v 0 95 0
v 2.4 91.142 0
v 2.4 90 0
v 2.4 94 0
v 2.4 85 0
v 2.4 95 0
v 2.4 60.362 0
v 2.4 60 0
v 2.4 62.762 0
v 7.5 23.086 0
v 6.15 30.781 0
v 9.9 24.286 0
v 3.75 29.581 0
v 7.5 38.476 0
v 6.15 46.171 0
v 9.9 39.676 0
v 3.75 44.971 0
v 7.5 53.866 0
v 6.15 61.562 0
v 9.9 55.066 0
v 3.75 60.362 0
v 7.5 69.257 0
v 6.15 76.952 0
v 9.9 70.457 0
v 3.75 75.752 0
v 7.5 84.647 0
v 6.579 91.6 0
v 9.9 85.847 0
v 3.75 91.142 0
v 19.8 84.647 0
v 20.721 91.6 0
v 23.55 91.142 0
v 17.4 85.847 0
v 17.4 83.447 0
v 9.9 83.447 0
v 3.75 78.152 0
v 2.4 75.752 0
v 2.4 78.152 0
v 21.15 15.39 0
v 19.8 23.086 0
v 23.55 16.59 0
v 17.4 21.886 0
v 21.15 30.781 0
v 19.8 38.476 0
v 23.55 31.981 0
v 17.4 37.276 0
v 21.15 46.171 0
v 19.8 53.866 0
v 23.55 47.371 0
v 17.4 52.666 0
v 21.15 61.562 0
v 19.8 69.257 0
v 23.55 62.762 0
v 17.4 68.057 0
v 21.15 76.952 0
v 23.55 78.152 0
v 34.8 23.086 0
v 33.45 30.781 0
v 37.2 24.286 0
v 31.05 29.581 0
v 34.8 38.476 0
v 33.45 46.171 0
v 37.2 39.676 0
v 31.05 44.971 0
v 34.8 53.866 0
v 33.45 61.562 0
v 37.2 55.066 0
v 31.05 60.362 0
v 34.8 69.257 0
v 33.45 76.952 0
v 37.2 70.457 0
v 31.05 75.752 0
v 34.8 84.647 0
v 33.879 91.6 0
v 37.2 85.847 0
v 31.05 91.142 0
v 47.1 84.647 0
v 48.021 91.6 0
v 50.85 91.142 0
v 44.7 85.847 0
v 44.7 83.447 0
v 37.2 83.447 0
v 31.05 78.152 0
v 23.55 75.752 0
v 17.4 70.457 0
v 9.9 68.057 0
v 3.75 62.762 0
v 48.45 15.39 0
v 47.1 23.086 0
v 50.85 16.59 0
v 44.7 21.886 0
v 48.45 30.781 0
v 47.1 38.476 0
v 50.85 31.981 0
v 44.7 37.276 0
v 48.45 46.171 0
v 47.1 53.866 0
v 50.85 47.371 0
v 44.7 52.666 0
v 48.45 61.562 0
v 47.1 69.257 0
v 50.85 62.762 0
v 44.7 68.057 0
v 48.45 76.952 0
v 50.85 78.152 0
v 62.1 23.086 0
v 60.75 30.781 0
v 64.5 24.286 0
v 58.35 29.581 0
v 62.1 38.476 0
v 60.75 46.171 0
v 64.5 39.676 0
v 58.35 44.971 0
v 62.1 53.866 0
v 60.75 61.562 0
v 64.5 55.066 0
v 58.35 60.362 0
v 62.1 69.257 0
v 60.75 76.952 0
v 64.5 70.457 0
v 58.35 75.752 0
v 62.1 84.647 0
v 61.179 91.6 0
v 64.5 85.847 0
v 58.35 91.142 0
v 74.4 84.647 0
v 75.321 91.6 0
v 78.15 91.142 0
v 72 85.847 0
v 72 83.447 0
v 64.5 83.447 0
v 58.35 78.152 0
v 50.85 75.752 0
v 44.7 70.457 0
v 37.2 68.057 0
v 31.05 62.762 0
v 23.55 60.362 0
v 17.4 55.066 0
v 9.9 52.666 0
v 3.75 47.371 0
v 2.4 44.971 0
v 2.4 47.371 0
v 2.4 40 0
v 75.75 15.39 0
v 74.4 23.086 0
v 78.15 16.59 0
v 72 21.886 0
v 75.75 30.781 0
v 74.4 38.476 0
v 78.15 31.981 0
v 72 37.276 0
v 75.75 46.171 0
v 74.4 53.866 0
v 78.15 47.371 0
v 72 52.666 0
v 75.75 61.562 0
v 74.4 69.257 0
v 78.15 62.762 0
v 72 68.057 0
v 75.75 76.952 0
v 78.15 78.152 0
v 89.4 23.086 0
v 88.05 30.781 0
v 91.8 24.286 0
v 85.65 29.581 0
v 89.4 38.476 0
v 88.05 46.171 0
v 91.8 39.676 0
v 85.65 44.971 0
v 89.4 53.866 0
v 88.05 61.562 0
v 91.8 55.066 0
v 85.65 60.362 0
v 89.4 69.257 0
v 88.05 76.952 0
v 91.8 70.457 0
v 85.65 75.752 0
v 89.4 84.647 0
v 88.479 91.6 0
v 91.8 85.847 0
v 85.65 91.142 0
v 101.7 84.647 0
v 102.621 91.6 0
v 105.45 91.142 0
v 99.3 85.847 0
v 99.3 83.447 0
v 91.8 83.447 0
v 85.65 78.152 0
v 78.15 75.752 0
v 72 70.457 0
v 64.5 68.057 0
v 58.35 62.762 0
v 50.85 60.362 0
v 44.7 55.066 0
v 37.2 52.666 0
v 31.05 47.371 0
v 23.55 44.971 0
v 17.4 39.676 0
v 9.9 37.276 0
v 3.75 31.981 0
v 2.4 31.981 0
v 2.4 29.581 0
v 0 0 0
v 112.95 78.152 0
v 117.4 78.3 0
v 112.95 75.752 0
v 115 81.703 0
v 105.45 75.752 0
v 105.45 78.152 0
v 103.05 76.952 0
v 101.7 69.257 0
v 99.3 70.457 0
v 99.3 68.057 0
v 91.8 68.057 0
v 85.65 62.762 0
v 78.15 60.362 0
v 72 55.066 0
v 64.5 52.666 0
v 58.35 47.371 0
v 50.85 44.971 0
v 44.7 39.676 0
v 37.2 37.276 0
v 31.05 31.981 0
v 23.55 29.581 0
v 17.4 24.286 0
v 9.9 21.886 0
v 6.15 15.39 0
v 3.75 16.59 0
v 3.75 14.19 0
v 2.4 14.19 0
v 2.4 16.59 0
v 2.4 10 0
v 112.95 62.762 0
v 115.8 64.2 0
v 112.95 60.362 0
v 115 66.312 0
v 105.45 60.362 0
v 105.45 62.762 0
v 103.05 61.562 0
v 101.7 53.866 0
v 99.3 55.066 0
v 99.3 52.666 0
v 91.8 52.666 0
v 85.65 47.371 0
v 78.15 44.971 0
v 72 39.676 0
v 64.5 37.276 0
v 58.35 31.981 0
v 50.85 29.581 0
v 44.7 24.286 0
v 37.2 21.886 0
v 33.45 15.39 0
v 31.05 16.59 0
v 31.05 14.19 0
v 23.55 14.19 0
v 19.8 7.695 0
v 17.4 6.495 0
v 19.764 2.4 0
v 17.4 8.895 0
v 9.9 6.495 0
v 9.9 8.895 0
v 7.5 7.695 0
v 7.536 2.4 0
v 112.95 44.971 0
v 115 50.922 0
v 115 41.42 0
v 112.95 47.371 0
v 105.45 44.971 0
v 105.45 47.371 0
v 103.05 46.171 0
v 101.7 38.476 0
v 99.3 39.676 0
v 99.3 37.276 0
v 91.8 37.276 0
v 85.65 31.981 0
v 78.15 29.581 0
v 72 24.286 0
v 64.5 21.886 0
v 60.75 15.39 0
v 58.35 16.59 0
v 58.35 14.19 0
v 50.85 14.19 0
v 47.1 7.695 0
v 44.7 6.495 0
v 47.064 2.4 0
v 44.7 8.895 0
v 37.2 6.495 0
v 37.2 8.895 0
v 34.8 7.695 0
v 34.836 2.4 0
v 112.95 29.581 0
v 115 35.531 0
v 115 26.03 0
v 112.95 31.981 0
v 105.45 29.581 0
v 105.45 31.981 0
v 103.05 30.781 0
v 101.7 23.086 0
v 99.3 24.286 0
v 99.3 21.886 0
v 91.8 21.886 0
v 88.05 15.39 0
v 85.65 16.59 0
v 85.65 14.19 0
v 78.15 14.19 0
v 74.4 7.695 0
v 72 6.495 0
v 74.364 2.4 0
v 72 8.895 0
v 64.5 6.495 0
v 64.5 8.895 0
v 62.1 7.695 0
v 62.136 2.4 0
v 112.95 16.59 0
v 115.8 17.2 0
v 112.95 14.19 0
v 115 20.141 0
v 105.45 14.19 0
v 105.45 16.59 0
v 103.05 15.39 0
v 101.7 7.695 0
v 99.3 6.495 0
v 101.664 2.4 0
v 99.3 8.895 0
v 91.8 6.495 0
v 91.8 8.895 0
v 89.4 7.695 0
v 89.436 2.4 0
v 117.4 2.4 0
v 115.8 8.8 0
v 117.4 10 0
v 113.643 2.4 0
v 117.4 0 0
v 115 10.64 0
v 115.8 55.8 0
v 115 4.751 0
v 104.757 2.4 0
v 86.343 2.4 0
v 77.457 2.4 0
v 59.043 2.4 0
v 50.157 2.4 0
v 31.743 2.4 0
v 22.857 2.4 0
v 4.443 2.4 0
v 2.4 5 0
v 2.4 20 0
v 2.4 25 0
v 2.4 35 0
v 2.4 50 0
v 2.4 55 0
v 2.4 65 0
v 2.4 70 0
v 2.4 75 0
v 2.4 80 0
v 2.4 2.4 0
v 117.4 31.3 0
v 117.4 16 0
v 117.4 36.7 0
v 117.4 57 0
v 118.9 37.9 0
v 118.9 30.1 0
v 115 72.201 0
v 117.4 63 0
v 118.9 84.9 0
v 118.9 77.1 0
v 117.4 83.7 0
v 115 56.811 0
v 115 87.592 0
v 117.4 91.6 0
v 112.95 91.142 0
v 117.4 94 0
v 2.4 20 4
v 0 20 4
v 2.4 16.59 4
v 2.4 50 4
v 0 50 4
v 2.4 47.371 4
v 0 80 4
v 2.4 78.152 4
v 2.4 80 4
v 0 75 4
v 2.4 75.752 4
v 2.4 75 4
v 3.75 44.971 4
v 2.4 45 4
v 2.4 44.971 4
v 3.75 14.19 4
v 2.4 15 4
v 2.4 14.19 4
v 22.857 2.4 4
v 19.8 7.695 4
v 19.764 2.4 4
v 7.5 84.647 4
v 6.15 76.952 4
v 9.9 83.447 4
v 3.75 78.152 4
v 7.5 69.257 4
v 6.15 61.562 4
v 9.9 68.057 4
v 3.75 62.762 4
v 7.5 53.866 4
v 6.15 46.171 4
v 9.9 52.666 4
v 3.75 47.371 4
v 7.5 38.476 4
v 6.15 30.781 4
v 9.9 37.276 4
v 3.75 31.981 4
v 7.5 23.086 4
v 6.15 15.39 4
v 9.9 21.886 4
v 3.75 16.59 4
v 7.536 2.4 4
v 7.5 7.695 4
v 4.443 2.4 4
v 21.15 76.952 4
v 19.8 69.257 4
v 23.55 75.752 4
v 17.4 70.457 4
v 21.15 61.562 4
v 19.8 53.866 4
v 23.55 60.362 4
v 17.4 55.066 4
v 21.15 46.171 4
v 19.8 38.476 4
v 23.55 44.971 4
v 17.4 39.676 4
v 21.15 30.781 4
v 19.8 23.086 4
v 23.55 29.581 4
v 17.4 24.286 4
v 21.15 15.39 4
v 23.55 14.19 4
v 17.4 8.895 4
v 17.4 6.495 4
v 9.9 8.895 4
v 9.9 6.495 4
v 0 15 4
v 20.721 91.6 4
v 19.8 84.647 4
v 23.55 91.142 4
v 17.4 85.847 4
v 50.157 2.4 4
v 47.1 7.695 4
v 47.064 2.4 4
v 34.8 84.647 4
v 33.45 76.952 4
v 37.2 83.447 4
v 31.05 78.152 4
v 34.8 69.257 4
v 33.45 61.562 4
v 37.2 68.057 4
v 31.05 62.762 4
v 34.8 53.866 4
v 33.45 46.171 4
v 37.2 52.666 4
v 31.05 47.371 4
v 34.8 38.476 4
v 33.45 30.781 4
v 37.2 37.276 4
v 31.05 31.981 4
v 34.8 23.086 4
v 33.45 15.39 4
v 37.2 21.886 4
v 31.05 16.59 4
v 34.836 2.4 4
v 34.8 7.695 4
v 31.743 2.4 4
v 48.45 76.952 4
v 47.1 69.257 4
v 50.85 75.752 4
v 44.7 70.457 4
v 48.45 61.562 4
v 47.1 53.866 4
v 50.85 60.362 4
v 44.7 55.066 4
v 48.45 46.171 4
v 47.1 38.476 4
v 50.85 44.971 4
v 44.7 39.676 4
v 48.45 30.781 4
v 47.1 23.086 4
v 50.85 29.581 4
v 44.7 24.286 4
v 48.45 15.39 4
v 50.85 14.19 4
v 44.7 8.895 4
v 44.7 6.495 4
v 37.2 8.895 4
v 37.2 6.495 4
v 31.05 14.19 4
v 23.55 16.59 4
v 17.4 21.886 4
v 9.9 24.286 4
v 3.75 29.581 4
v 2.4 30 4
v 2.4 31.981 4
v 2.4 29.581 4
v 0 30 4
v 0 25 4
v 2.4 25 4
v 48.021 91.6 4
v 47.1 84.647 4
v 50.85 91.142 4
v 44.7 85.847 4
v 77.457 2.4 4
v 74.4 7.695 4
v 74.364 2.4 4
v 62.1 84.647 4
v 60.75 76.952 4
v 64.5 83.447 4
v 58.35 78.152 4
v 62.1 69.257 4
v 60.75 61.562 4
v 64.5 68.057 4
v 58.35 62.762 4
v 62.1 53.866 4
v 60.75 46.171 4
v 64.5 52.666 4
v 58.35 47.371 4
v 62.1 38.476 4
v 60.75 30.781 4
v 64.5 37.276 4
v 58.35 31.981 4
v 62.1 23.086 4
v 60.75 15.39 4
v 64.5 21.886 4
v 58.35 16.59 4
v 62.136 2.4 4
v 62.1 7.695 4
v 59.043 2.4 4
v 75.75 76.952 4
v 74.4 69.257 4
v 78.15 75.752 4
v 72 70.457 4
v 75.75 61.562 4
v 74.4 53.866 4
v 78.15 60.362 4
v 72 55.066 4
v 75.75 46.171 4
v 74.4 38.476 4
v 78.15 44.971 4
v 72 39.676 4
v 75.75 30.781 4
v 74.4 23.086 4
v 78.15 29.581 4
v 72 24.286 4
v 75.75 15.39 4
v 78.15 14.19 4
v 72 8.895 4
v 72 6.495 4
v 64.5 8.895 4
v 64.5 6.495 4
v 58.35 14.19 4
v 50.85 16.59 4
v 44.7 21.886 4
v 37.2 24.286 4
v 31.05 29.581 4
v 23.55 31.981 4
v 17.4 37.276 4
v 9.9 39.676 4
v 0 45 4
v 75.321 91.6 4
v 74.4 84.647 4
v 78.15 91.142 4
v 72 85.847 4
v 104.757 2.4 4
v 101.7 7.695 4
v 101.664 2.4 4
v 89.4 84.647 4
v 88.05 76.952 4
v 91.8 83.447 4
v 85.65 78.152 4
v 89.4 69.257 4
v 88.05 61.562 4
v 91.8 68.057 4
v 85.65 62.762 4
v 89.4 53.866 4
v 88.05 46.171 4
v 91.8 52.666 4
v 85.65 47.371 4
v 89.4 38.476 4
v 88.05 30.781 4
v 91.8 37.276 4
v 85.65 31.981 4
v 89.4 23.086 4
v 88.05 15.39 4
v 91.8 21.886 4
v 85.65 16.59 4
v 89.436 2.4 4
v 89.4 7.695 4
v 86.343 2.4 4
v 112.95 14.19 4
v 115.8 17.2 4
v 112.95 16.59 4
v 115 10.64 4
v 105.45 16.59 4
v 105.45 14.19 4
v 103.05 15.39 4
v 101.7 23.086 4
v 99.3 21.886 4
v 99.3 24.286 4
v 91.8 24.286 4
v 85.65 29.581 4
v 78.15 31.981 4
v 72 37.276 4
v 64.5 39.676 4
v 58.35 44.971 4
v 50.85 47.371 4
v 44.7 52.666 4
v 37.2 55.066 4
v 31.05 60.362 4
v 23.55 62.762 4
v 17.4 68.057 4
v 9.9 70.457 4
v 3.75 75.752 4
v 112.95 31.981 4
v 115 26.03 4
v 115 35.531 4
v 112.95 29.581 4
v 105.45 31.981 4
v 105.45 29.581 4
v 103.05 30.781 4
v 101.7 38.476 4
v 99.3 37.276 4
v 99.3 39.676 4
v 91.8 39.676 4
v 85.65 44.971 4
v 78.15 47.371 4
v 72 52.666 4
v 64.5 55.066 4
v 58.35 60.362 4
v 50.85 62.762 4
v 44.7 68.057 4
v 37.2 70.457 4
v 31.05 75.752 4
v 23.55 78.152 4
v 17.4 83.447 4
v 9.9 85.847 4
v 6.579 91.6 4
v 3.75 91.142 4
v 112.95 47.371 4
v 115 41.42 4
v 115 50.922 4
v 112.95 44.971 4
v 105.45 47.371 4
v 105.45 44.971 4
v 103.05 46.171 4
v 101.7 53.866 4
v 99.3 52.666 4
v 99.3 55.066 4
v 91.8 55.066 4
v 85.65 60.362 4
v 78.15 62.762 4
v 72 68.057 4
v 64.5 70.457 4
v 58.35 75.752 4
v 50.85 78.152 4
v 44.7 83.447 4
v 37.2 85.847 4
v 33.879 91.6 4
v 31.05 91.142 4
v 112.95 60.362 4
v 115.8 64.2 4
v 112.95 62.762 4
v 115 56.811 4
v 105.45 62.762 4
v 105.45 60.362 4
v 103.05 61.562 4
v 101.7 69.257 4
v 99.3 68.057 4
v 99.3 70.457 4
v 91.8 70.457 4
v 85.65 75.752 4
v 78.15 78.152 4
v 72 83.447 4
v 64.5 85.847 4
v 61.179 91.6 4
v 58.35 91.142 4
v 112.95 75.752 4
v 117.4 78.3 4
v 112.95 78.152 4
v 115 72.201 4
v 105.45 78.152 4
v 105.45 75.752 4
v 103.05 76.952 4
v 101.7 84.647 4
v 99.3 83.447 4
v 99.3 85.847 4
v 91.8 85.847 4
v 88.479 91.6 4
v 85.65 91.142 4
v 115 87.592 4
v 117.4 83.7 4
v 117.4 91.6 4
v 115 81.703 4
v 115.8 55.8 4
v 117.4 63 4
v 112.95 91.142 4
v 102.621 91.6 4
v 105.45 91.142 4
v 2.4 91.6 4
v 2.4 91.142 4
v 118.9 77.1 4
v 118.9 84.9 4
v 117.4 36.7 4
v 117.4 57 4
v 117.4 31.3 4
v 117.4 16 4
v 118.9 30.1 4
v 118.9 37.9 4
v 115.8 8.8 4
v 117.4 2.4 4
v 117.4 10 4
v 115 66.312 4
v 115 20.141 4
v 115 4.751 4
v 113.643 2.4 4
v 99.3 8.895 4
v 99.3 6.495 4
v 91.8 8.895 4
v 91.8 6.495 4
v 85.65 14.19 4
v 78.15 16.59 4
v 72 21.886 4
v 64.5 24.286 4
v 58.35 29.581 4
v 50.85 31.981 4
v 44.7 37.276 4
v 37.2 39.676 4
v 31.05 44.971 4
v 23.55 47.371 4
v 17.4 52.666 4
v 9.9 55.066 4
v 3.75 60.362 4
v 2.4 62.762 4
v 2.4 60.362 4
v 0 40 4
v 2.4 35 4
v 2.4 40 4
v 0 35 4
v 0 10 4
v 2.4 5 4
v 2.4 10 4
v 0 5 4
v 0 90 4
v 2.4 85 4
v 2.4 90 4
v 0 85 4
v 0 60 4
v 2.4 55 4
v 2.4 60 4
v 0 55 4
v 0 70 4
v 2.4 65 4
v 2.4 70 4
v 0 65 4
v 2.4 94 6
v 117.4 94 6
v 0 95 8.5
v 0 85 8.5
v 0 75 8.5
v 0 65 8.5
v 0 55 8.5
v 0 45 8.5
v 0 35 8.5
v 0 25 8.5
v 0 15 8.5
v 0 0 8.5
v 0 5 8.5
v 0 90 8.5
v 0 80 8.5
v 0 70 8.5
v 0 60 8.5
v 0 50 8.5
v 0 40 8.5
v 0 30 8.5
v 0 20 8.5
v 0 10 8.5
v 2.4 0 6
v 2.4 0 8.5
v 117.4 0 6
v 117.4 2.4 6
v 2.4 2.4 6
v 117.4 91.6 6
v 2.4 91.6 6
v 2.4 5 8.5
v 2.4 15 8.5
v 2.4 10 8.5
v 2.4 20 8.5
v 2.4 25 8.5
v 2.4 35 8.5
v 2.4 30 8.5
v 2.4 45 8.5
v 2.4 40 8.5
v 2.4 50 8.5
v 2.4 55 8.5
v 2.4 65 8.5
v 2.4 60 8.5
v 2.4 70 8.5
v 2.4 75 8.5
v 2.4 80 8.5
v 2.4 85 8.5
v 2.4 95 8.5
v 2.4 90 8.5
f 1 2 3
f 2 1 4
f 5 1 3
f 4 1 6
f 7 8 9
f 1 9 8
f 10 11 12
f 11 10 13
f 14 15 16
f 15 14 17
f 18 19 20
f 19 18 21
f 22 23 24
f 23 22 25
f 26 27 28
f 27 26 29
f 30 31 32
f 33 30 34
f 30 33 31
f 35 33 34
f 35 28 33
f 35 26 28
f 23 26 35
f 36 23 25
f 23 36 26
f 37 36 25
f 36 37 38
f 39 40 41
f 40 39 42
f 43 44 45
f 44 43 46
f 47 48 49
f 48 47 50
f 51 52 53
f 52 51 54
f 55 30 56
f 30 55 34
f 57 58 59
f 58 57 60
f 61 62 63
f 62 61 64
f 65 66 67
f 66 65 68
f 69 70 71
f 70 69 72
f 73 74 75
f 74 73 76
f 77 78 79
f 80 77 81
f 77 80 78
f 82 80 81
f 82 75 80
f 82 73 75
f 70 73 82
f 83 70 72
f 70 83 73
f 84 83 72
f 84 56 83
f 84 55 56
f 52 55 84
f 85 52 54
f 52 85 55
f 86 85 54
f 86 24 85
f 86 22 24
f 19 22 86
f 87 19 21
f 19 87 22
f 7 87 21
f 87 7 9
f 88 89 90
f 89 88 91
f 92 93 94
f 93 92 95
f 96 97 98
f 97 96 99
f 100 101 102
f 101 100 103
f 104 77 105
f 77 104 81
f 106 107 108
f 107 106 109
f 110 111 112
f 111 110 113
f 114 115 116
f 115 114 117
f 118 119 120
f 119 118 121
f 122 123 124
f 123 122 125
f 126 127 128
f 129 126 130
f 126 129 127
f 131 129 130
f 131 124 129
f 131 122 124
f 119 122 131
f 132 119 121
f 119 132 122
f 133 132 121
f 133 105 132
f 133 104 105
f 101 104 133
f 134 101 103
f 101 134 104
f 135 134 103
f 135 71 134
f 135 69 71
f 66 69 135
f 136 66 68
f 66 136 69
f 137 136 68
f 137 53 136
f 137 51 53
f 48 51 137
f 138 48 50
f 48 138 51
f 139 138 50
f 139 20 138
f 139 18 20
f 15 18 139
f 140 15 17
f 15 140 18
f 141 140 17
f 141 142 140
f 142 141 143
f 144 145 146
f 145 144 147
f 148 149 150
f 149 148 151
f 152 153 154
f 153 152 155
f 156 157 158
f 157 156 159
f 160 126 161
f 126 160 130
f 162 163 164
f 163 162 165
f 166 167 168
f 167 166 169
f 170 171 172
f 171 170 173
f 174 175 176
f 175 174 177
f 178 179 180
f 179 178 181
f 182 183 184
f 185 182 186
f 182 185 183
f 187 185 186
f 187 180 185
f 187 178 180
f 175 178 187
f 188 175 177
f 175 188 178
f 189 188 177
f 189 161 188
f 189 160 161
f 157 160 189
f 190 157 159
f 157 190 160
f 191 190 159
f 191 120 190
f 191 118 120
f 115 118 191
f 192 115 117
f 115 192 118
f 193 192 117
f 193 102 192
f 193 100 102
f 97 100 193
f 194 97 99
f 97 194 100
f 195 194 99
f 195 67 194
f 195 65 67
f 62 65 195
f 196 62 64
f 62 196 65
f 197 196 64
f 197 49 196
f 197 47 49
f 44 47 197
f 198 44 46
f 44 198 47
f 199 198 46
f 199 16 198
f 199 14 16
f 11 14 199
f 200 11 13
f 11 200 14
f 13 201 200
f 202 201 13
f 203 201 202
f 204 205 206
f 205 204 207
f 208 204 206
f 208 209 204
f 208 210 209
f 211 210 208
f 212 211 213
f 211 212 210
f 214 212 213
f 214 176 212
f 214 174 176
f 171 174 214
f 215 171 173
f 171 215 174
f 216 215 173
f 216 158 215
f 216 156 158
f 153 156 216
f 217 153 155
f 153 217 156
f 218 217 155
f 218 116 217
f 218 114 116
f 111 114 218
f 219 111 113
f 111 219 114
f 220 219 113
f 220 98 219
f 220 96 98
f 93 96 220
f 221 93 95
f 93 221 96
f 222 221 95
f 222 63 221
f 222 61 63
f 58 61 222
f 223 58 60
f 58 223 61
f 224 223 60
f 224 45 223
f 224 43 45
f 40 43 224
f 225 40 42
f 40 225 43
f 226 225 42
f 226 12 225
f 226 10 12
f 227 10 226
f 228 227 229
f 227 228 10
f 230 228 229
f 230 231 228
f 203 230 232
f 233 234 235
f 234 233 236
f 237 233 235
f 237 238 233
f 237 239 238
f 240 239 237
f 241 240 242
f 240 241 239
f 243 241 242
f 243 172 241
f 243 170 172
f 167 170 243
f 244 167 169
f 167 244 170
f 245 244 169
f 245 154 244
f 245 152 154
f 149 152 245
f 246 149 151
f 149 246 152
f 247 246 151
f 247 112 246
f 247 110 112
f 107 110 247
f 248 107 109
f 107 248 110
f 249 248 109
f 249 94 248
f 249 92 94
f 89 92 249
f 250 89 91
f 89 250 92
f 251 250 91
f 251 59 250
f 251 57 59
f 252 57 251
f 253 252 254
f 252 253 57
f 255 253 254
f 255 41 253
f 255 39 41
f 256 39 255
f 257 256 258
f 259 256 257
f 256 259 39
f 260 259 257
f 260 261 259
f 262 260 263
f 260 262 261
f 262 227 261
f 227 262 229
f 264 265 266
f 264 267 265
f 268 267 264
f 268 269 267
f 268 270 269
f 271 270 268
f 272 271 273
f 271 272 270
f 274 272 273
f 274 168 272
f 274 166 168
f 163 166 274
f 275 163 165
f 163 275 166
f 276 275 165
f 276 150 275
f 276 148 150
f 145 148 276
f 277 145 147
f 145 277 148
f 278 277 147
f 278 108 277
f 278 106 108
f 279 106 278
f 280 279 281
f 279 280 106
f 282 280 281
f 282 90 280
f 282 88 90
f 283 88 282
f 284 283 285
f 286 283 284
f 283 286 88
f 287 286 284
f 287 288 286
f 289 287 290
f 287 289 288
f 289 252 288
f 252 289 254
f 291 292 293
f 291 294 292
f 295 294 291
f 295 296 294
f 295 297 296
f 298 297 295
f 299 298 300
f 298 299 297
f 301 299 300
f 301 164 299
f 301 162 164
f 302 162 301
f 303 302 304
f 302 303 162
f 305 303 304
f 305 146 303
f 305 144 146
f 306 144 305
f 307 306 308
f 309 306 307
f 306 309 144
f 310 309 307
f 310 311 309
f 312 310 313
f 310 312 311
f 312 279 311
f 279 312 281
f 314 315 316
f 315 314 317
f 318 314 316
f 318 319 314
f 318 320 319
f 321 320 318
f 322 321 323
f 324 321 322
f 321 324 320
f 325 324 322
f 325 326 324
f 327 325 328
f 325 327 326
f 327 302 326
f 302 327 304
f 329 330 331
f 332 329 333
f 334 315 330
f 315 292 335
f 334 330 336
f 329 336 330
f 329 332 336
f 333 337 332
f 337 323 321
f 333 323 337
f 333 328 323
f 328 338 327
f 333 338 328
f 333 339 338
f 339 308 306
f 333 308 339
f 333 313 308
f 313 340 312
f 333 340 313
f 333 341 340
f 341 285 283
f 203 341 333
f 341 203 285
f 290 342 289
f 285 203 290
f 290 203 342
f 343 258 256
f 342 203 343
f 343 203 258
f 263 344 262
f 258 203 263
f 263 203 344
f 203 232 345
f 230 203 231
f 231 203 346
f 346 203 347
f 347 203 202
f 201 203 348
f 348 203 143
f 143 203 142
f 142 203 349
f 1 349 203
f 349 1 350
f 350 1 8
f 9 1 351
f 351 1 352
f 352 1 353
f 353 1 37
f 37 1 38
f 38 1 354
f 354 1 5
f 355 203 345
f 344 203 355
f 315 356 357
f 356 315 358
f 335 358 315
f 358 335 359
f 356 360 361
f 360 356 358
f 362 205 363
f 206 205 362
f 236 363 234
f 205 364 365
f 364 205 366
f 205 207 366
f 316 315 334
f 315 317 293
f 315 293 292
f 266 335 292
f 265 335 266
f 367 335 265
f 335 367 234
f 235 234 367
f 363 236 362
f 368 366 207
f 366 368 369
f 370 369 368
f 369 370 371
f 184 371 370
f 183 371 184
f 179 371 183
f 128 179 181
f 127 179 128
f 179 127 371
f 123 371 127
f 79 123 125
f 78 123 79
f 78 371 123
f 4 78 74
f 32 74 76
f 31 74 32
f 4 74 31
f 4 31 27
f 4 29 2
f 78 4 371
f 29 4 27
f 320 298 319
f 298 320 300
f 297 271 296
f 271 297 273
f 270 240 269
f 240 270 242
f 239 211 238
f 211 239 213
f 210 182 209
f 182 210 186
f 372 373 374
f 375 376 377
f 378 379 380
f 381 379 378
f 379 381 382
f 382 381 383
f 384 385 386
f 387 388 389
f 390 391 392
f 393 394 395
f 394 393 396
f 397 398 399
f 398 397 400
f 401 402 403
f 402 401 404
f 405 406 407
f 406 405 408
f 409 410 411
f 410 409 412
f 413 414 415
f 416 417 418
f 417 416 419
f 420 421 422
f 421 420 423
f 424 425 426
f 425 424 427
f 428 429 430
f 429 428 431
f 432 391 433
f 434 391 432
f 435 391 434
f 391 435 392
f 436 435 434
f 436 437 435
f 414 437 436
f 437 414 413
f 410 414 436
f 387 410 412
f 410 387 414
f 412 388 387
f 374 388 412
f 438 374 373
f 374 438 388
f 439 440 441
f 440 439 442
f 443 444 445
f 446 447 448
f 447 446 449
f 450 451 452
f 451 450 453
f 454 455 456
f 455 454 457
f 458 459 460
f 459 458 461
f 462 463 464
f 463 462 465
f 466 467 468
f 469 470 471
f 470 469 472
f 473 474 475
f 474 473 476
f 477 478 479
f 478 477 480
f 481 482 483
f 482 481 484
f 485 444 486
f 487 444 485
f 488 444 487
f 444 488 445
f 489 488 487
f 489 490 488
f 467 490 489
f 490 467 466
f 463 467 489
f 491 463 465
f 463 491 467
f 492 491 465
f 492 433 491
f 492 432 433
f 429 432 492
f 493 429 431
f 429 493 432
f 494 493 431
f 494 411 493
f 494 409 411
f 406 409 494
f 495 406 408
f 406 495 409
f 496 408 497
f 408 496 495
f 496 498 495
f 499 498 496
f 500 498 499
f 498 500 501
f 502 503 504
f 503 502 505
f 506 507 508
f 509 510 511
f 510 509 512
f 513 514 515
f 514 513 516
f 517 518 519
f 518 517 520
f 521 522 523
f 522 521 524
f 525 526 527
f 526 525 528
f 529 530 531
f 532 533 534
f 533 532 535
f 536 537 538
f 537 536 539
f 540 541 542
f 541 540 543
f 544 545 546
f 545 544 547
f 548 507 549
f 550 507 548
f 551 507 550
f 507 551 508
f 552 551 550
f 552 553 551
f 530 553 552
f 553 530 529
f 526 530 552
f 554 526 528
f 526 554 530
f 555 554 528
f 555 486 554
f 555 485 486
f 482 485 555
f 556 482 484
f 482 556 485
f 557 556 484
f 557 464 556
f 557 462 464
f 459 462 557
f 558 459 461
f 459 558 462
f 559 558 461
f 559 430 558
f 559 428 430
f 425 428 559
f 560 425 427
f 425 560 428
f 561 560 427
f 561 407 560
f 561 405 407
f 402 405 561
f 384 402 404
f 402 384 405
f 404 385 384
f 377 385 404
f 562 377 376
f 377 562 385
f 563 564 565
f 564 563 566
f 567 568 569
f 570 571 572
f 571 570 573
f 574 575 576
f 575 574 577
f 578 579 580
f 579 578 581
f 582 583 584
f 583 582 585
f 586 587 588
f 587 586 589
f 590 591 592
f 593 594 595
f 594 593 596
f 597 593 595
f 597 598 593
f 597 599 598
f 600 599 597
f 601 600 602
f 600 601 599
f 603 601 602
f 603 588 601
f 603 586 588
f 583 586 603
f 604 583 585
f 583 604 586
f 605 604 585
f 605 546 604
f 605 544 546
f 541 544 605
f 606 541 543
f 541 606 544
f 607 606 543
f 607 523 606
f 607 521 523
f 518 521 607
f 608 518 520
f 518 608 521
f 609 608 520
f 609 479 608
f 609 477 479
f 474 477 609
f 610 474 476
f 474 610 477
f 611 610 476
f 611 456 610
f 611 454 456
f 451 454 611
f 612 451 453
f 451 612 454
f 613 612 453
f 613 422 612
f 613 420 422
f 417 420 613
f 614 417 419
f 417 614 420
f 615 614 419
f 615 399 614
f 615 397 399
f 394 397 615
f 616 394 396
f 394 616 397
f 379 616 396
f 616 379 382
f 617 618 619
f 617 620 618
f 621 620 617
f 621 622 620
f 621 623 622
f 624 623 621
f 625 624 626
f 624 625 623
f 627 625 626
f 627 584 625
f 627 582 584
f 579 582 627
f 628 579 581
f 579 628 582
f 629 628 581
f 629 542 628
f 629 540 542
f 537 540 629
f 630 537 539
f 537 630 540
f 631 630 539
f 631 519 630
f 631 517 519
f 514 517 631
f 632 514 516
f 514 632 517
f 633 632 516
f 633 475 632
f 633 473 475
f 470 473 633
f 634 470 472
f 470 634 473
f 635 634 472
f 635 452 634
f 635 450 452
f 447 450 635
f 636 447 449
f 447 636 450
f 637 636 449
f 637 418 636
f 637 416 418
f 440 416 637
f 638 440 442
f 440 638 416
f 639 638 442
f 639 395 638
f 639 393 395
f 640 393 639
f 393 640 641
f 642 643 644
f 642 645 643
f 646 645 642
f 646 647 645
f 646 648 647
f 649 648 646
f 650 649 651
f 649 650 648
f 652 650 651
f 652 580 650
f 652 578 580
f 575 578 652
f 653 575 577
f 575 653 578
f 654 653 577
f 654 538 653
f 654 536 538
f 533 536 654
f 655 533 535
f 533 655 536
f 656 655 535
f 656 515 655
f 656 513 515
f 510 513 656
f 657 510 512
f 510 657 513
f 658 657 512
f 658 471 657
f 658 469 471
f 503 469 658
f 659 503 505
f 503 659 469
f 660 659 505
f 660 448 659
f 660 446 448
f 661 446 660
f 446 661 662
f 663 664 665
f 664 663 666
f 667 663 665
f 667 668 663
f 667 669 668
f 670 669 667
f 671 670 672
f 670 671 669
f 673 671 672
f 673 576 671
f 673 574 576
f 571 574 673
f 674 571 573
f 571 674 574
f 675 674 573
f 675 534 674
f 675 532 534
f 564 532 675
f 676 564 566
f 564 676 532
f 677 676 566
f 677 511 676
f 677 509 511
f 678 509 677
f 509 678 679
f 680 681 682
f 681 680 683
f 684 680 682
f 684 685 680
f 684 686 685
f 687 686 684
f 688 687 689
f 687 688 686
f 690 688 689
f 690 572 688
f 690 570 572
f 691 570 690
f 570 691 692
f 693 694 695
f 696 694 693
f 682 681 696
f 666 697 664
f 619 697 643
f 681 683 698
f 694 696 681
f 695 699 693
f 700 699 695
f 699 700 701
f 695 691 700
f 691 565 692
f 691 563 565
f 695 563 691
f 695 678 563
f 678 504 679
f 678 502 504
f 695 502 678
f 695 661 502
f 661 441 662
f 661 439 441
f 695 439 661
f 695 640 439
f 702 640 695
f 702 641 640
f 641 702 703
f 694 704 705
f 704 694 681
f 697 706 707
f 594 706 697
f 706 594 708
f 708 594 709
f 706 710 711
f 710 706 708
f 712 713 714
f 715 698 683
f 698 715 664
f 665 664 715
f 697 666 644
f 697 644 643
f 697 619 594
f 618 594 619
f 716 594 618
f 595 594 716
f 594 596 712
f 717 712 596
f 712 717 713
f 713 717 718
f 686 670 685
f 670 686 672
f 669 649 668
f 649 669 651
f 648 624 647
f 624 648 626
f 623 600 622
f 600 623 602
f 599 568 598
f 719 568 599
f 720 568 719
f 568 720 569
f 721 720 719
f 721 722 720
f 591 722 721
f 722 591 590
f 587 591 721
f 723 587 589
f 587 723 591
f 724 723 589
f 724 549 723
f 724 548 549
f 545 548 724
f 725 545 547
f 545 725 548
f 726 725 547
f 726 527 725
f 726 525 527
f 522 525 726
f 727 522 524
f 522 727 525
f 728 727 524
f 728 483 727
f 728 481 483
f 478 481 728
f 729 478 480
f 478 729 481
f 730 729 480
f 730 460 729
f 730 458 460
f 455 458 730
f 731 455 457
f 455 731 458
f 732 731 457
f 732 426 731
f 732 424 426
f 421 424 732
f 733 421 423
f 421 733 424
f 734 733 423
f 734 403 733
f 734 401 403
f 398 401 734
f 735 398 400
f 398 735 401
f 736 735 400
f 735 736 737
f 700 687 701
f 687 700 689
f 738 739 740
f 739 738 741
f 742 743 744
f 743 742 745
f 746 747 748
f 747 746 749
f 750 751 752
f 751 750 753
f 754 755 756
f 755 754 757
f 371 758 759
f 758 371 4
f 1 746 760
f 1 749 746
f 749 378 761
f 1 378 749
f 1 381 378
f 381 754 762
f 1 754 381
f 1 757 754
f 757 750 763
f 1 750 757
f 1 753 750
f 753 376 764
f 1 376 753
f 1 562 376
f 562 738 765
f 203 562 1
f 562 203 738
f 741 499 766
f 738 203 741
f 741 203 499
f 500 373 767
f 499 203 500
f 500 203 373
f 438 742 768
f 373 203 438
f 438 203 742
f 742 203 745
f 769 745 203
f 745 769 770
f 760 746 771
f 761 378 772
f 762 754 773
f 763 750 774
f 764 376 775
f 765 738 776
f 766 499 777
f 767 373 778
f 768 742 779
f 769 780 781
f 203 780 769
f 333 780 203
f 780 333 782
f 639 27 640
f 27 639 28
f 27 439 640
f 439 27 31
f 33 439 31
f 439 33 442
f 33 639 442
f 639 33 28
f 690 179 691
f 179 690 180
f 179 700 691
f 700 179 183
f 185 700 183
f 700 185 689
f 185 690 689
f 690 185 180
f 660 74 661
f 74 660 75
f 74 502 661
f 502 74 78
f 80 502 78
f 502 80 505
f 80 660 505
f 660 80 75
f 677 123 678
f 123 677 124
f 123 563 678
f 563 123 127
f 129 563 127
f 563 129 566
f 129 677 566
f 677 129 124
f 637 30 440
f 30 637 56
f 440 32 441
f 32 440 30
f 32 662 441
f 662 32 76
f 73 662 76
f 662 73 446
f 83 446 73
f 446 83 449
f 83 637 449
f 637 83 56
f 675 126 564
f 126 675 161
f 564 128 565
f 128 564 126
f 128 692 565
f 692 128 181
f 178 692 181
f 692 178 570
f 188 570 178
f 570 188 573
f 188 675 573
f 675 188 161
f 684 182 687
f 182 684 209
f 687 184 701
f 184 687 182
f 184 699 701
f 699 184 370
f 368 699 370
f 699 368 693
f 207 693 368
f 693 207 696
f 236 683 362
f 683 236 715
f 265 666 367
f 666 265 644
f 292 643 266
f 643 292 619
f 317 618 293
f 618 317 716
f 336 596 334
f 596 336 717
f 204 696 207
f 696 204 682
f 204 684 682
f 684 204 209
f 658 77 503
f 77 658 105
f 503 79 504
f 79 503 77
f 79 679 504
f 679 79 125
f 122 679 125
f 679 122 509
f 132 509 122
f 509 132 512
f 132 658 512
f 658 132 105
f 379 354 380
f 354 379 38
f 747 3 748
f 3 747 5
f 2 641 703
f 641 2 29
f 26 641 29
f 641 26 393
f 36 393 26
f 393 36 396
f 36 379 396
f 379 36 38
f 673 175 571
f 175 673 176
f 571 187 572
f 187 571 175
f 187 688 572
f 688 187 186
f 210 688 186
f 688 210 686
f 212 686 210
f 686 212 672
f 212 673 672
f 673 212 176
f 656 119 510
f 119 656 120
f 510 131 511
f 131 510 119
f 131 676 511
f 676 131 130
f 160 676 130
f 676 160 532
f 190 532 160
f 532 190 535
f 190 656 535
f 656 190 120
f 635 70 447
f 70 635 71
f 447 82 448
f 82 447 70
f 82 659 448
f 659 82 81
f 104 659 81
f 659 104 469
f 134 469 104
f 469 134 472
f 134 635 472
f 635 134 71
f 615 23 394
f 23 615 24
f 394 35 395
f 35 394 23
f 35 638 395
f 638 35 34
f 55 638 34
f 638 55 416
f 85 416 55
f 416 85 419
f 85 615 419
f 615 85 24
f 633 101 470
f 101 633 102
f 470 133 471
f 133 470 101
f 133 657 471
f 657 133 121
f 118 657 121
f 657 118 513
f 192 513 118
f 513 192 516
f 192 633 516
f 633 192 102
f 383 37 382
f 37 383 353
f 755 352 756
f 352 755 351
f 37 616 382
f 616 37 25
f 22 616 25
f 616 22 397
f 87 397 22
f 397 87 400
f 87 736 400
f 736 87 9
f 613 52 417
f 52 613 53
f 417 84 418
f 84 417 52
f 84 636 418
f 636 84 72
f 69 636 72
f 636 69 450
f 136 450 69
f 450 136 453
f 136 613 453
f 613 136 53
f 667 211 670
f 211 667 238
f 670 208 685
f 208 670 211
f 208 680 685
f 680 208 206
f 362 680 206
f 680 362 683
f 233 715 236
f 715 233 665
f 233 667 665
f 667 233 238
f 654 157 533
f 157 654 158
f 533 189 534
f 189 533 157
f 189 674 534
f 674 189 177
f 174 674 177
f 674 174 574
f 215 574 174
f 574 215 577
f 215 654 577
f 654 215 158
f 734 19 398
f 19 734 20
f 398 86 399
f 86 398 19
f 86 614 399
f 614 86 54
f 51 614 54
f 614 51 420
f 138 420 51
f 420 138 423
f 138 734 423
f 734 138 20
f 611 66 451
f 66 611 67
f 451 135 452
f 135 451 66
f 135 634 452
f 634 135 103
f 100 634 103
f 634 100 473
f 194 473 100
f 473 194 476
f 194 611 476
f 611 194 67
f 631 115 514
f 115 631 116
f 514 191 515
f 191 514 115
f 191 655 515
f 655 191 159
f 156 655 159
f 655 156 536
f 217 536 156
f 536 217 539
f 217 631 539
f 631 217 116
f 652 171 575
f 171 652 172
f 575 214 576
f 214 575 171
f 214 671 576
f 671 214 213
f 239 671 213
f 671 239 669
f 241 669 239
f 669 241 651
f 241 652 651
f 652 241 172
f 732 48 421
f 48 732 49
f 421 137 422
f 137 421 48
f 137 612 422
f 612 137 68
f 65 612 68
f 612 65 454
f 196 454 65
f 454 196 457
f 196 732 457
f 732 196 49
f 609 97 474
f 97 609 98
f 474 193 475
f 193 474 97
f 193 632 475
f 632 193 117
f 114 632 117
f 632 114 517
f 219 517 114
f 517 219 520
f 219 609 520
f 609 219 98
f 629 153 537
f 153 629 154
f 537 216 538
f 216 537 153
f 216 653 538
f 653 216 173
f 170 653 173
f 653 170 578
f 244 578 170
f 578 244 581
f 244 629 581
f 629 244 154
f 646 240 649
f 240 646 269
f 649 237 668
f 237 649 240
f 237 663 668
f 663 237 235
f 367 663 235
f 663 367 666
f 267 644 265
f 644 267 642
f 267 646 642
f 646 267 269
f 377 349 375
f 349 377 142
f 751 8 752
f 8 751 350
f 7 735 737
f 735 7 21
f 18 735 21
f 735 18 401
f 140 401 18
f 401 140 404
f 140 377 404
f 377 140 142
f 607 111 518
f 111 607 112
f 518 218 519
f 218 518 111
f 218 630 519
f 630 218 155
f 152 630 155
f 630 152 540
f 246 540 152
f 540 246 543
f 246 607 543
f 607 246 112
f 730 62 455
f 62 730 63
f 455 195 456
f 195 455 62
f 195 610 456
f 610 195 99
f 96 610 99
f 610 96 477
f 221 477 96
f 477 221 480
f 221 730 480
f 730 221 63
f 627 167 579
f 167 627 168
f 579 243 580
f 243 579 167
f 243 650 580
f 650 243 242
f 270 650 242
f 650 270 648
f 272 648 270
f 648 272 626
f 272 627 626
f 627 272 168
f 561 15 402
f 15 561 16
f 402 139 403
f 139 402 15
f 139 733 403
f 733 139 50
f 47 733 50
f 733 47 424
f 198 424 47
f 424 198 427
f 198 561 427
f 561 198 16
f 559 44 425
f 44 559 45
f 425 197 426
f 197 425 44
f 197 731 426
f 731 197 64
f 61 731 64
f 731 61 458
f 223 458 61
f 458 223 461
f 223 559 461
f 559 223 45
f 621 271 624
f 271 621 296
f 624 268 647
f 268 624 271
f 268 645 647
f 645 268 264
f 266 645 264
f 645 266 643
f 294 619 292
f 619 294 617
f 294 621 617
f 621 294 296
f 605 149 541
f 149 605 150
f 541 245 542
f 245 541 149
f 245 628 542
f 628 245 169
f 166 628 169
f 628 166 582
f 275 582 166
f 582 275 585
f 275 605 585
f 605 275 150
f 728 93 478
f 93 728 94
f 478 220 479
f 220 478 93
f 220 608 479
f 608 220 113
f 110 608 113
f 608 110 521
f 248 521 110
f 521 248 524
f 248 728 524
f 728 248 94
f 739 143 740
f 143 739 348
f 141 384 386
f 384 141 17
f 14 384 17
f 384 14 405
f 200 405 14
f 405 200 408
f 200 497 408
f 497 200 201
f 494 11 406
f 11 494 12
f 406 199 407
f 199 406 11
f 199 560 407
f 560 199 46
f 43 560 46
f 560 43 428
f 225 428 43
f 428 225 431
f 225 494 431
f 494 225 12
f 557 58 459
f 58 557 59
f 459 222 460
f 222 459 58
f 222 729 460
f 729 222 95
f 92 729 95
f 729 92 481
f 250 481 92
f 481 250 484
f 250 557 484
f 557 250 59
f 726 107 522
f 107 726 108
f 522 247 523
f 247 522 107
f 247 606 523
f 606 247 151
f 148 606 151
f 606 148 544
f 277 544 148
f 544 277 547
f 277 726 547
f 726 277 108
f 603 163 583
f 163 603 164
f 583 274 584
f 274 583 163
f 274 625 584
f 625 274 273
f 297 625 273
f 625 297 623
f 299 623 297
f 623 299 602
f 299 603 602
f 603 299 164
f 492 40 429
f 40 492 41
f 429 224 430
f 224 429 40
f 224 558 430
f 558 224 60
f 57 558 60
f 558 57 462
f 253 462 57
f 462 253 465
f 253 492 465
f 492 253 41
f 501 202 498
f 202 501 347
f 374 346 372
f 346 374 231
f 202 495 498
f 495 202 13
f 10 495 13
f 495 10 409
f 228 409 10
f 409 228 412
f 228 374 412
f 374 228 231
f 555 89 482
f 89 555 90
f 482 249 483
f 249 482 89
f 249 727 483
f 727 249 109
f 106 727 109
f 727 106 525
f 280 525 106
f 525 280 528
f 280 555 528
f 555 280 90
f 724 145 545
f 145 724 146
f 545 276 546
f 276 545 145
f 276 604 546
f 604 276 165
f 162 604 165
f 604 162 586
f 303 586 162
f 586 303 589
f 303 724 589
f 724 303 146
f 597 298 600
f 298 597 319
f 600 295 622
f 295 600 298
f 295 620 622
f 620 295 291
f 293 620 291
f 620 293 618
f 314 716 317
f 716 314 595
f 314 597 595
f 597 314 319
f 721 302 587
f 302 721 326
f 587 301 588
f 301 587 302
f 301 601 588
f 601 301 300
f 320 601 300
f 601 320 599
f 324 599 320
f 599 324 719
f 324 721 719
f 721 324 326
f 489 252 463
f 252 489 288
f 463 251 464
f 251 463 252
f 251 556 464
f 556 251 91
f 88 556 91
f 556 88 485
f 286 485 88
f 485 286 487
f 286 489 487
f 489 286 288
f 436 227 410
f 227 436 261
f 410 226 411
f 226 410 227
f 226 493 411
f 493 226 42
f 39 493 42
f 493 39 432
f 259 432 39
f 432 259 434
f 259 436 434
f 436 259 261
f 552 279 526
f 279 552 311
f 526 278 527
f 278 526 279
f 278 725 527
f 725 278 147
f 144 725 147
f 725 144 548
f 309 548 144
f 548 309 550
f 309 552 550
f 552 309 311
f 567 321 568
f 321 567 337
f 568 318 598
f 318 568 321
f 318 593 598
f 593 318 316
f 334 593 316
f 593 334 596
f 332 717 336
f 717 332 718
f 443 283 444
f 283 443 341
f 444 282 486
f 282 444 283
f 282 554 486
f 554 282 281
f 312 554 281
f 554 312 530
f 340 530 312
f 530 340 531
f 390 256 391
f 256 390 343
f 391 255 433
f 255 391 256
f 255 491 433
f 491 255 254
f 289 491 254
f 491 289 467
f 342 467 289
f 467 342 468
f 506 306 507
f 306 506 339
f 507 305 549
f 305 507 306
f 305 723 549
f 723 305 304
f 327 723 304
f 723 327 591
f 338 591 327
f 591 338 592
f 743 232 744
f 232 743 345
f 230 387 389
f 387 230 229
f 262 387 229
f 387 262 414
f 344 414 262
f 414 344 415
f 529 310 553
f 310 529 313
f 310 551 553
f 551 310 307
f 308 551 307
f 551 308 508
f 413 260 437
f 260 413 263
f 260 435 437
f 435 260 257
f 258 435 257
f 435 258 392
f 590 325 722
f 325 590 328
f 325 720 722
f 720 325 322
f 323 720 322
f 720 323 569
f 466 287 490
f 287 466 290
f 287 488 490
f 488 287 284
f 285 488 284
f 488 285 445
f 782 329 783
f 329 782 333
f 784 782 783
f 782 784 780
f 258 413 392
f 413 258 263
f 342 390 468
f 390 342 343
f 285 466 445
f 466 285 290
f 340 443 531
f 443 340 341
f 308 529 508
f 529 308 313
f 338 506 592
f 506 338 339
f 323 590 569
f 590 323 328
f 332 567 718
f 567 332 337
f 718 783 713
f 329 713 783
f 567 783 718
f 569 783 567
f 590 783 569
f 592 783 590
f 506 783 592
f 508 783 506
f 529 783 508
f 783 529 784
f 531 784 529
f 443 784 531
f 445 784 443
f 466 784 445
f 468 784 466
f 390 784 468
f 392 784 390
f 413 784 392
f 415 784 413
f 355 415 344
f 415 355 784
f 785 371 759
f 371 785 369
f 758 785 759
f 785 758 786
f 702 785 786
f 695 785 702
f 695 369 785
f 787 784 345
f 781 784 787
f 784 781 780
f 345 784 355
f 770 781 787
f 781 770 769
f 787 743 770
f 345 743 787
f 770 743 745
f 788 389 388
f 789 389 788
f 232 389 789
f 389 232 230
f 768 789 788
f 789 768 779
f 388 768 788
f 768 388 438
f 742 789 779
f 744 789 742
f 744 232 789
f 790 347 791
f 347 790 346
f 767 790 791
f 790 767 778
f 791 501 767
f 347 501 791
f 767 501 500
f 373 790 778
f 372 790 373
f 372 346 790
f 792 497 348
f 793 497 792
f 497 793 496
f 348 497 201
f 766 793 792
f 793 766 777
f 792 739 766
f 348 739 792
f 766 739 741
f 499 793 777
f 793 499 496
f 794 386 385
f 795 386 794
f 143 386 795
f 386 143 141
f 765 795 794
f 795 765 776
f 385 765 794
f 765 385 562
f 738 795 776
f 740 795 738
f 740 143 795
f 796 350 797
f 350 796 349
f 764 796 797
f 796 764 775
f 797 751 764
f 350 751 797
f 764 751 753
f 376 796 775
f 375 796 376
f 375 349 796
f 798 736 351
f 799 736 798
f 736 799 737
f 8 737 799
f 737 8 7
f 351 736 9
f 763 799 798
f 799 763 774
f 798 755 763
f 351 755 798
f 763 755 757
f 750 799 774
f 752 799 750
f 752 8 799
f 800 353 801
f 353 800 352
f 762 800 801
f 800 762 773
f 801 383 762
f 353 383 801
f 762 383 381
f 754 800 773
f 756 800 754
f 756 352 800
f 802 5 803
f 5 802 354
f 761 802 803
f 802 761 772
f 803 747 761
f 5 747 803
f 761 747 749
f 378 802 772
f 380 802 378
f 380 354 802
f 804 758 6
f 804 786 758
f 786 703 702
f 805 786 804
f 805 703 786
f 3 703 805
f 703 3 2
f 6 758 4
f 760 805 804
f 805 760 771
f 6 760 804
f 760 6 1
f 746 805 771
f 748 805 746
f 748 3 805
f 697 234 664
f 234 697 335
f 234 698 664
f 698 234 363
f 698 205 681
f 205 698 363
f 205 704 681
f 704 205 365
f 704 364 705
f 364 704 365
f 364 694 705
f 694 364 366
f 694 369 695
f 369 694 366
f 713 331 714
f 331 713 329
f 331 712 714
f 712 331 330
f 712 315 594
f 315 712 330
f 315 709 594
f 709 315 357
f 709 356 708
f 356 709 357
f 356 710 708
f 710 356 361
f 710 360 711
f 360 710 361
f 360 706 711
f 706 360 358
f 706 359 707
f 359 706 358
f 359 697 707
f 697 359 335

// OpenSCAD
plateThickness = 4;
plateGrillWidth = 2.4;
plateHoleSize = 15;

// pair of two, each having one side of the grill hanging over
plateWidth = (230 / 2) + plateGrillWidth;
plateDepth = 94;

plateLift = 2;
plateHolderHeight = 4.5;
plateHolderInterval = 5;

gripDepth = 1.6;
gripStartWidth = 6;
gripEndWidth = gripStartWidth + 2.4;
gripFrontWiggle = 0.1;
gripSideWiggle = 0.3;
gripOffset = 10;

$fa = $preview ? 2 : 0.4;
$fs = $preview ? 2 : 0.4;

use <MCAD/regular_shapes.scad>

module plate() {    
    hexGrill(plateWidth, plateDepth, plateThickness, plateGrillWidth, plateHoleSize);
}

module hexGrill(width, depth, height, thickness, holeSize) {
    linear_extrude(height)
    difference() {
        square([width, depth]);
        intersection() {
            translate([thickness, thickness])
            square([width - 2 * thickness, depth - 2 * thickness]);
            union() {
                holeYSpacing = thickness + holeSize * sqrt(3) / 2;
                holeXSpacing = thickness + 0.75 * holeSize;
                grillGridXSize = ceil(width / holeSize) + 1;
                grillGridYSize = ceil(depth / holeSize) + 1;
                for(y = [for(i = [-grillGridYSize:grillGridYSize]) i * holeYSpacing]) {
                    for(ix = [-grillGridXSize:grillGridXSize]) {
                        x = ix * holeXSpacing;
                        translate([x, y + (ix % 2 == 0 ? holeYSpacing / 2 : 0)])
                        hexagon(holeSize / 2);
                    }
                }
            }
        }
    }
}

module liftSpacers() {
    cube([plateWidth, plateGrillWidth, plateThickness + plateLift]);
    
    translate([0, plateDepth - plateGrillWidth, 0])
    cube([plateWidth, plateGrillWidth, plateThickness + plateLift]);
}

module plateHolder() {
    for(y = [0:plateHolderInterval * 2:plateDepth]) {
        translate([0, y, 0])
        cube([plateGrillWidth, plateHolderInterval, plateThickness + plateHolderHeight]);
    }
}

module gripInterface() {
    linear_extrude(plateThickness) {
        centerY = plateDepth / 2;
        singleOffset = gripOffset + gripStartWidth / 2;
        difference() {
            square([plateGrillWidth, plateDepth]);
            
            gripInset(singleOffset, plateGrillWidth);
            gripInset(centerY + singleOffset, plateGrillWidth);
        }
        
        gripOutset(plateDepth - singleOffset, plateGrillWidth);
        gripOutset(centerY - singleOffset, plateGrillWidth);
    }
}

// TODO: fix grip inset and outset
module gripInset(insetY, thickness) {    
    polygon([
        [thickness, insetY - gripStartWidth / 2],
        [thickness, insetY + gripStartWidth / 2],
        [thickness - gripDepth, insetY + gripEndWidth / 2],
        [thickness - gripDepth, insetY - gripEndWidth / 2]
    ]);
}

module gripOutset(outsetY, thickness) {
    polygon([
        [thickness, outsetY + gripStartWidth / 2 - gripSideWiggle],
        [thickness, outsetY - gripStartWidth / 2 + gripSideWiggle],
        [thickness + gripDepth - gripFrontWiggle, outsetY - gripEndWidth / 2 + gripSideWiggle],
        [thickness + gripDepth - gripFrontWiggle, outsetY + gripEndWidth / 2 - gripSideWiggle]
    ]);
}

module showerPlate() {
    difference() {
        plate();
        
        translate([plateWidth - plateGrillWidth, 0, 0])
        cube([plateGrillWidth, plateDepth, plateThickness]);
    }
    translate([plateWidth - plateGrillWidth, 0, 0])
    gripInterface();
    
    liftSpacers();
    
    plateHolder();
}

module testAssembly() {
    translate([-plateGrillWidth, 0, 0]) {
        showerPlate();
        
        translate([2 * plateWidth, plateDepth, 0])
        rotate([0, 0, 180])
        showerPlate();
    }
}

showerPlate();
